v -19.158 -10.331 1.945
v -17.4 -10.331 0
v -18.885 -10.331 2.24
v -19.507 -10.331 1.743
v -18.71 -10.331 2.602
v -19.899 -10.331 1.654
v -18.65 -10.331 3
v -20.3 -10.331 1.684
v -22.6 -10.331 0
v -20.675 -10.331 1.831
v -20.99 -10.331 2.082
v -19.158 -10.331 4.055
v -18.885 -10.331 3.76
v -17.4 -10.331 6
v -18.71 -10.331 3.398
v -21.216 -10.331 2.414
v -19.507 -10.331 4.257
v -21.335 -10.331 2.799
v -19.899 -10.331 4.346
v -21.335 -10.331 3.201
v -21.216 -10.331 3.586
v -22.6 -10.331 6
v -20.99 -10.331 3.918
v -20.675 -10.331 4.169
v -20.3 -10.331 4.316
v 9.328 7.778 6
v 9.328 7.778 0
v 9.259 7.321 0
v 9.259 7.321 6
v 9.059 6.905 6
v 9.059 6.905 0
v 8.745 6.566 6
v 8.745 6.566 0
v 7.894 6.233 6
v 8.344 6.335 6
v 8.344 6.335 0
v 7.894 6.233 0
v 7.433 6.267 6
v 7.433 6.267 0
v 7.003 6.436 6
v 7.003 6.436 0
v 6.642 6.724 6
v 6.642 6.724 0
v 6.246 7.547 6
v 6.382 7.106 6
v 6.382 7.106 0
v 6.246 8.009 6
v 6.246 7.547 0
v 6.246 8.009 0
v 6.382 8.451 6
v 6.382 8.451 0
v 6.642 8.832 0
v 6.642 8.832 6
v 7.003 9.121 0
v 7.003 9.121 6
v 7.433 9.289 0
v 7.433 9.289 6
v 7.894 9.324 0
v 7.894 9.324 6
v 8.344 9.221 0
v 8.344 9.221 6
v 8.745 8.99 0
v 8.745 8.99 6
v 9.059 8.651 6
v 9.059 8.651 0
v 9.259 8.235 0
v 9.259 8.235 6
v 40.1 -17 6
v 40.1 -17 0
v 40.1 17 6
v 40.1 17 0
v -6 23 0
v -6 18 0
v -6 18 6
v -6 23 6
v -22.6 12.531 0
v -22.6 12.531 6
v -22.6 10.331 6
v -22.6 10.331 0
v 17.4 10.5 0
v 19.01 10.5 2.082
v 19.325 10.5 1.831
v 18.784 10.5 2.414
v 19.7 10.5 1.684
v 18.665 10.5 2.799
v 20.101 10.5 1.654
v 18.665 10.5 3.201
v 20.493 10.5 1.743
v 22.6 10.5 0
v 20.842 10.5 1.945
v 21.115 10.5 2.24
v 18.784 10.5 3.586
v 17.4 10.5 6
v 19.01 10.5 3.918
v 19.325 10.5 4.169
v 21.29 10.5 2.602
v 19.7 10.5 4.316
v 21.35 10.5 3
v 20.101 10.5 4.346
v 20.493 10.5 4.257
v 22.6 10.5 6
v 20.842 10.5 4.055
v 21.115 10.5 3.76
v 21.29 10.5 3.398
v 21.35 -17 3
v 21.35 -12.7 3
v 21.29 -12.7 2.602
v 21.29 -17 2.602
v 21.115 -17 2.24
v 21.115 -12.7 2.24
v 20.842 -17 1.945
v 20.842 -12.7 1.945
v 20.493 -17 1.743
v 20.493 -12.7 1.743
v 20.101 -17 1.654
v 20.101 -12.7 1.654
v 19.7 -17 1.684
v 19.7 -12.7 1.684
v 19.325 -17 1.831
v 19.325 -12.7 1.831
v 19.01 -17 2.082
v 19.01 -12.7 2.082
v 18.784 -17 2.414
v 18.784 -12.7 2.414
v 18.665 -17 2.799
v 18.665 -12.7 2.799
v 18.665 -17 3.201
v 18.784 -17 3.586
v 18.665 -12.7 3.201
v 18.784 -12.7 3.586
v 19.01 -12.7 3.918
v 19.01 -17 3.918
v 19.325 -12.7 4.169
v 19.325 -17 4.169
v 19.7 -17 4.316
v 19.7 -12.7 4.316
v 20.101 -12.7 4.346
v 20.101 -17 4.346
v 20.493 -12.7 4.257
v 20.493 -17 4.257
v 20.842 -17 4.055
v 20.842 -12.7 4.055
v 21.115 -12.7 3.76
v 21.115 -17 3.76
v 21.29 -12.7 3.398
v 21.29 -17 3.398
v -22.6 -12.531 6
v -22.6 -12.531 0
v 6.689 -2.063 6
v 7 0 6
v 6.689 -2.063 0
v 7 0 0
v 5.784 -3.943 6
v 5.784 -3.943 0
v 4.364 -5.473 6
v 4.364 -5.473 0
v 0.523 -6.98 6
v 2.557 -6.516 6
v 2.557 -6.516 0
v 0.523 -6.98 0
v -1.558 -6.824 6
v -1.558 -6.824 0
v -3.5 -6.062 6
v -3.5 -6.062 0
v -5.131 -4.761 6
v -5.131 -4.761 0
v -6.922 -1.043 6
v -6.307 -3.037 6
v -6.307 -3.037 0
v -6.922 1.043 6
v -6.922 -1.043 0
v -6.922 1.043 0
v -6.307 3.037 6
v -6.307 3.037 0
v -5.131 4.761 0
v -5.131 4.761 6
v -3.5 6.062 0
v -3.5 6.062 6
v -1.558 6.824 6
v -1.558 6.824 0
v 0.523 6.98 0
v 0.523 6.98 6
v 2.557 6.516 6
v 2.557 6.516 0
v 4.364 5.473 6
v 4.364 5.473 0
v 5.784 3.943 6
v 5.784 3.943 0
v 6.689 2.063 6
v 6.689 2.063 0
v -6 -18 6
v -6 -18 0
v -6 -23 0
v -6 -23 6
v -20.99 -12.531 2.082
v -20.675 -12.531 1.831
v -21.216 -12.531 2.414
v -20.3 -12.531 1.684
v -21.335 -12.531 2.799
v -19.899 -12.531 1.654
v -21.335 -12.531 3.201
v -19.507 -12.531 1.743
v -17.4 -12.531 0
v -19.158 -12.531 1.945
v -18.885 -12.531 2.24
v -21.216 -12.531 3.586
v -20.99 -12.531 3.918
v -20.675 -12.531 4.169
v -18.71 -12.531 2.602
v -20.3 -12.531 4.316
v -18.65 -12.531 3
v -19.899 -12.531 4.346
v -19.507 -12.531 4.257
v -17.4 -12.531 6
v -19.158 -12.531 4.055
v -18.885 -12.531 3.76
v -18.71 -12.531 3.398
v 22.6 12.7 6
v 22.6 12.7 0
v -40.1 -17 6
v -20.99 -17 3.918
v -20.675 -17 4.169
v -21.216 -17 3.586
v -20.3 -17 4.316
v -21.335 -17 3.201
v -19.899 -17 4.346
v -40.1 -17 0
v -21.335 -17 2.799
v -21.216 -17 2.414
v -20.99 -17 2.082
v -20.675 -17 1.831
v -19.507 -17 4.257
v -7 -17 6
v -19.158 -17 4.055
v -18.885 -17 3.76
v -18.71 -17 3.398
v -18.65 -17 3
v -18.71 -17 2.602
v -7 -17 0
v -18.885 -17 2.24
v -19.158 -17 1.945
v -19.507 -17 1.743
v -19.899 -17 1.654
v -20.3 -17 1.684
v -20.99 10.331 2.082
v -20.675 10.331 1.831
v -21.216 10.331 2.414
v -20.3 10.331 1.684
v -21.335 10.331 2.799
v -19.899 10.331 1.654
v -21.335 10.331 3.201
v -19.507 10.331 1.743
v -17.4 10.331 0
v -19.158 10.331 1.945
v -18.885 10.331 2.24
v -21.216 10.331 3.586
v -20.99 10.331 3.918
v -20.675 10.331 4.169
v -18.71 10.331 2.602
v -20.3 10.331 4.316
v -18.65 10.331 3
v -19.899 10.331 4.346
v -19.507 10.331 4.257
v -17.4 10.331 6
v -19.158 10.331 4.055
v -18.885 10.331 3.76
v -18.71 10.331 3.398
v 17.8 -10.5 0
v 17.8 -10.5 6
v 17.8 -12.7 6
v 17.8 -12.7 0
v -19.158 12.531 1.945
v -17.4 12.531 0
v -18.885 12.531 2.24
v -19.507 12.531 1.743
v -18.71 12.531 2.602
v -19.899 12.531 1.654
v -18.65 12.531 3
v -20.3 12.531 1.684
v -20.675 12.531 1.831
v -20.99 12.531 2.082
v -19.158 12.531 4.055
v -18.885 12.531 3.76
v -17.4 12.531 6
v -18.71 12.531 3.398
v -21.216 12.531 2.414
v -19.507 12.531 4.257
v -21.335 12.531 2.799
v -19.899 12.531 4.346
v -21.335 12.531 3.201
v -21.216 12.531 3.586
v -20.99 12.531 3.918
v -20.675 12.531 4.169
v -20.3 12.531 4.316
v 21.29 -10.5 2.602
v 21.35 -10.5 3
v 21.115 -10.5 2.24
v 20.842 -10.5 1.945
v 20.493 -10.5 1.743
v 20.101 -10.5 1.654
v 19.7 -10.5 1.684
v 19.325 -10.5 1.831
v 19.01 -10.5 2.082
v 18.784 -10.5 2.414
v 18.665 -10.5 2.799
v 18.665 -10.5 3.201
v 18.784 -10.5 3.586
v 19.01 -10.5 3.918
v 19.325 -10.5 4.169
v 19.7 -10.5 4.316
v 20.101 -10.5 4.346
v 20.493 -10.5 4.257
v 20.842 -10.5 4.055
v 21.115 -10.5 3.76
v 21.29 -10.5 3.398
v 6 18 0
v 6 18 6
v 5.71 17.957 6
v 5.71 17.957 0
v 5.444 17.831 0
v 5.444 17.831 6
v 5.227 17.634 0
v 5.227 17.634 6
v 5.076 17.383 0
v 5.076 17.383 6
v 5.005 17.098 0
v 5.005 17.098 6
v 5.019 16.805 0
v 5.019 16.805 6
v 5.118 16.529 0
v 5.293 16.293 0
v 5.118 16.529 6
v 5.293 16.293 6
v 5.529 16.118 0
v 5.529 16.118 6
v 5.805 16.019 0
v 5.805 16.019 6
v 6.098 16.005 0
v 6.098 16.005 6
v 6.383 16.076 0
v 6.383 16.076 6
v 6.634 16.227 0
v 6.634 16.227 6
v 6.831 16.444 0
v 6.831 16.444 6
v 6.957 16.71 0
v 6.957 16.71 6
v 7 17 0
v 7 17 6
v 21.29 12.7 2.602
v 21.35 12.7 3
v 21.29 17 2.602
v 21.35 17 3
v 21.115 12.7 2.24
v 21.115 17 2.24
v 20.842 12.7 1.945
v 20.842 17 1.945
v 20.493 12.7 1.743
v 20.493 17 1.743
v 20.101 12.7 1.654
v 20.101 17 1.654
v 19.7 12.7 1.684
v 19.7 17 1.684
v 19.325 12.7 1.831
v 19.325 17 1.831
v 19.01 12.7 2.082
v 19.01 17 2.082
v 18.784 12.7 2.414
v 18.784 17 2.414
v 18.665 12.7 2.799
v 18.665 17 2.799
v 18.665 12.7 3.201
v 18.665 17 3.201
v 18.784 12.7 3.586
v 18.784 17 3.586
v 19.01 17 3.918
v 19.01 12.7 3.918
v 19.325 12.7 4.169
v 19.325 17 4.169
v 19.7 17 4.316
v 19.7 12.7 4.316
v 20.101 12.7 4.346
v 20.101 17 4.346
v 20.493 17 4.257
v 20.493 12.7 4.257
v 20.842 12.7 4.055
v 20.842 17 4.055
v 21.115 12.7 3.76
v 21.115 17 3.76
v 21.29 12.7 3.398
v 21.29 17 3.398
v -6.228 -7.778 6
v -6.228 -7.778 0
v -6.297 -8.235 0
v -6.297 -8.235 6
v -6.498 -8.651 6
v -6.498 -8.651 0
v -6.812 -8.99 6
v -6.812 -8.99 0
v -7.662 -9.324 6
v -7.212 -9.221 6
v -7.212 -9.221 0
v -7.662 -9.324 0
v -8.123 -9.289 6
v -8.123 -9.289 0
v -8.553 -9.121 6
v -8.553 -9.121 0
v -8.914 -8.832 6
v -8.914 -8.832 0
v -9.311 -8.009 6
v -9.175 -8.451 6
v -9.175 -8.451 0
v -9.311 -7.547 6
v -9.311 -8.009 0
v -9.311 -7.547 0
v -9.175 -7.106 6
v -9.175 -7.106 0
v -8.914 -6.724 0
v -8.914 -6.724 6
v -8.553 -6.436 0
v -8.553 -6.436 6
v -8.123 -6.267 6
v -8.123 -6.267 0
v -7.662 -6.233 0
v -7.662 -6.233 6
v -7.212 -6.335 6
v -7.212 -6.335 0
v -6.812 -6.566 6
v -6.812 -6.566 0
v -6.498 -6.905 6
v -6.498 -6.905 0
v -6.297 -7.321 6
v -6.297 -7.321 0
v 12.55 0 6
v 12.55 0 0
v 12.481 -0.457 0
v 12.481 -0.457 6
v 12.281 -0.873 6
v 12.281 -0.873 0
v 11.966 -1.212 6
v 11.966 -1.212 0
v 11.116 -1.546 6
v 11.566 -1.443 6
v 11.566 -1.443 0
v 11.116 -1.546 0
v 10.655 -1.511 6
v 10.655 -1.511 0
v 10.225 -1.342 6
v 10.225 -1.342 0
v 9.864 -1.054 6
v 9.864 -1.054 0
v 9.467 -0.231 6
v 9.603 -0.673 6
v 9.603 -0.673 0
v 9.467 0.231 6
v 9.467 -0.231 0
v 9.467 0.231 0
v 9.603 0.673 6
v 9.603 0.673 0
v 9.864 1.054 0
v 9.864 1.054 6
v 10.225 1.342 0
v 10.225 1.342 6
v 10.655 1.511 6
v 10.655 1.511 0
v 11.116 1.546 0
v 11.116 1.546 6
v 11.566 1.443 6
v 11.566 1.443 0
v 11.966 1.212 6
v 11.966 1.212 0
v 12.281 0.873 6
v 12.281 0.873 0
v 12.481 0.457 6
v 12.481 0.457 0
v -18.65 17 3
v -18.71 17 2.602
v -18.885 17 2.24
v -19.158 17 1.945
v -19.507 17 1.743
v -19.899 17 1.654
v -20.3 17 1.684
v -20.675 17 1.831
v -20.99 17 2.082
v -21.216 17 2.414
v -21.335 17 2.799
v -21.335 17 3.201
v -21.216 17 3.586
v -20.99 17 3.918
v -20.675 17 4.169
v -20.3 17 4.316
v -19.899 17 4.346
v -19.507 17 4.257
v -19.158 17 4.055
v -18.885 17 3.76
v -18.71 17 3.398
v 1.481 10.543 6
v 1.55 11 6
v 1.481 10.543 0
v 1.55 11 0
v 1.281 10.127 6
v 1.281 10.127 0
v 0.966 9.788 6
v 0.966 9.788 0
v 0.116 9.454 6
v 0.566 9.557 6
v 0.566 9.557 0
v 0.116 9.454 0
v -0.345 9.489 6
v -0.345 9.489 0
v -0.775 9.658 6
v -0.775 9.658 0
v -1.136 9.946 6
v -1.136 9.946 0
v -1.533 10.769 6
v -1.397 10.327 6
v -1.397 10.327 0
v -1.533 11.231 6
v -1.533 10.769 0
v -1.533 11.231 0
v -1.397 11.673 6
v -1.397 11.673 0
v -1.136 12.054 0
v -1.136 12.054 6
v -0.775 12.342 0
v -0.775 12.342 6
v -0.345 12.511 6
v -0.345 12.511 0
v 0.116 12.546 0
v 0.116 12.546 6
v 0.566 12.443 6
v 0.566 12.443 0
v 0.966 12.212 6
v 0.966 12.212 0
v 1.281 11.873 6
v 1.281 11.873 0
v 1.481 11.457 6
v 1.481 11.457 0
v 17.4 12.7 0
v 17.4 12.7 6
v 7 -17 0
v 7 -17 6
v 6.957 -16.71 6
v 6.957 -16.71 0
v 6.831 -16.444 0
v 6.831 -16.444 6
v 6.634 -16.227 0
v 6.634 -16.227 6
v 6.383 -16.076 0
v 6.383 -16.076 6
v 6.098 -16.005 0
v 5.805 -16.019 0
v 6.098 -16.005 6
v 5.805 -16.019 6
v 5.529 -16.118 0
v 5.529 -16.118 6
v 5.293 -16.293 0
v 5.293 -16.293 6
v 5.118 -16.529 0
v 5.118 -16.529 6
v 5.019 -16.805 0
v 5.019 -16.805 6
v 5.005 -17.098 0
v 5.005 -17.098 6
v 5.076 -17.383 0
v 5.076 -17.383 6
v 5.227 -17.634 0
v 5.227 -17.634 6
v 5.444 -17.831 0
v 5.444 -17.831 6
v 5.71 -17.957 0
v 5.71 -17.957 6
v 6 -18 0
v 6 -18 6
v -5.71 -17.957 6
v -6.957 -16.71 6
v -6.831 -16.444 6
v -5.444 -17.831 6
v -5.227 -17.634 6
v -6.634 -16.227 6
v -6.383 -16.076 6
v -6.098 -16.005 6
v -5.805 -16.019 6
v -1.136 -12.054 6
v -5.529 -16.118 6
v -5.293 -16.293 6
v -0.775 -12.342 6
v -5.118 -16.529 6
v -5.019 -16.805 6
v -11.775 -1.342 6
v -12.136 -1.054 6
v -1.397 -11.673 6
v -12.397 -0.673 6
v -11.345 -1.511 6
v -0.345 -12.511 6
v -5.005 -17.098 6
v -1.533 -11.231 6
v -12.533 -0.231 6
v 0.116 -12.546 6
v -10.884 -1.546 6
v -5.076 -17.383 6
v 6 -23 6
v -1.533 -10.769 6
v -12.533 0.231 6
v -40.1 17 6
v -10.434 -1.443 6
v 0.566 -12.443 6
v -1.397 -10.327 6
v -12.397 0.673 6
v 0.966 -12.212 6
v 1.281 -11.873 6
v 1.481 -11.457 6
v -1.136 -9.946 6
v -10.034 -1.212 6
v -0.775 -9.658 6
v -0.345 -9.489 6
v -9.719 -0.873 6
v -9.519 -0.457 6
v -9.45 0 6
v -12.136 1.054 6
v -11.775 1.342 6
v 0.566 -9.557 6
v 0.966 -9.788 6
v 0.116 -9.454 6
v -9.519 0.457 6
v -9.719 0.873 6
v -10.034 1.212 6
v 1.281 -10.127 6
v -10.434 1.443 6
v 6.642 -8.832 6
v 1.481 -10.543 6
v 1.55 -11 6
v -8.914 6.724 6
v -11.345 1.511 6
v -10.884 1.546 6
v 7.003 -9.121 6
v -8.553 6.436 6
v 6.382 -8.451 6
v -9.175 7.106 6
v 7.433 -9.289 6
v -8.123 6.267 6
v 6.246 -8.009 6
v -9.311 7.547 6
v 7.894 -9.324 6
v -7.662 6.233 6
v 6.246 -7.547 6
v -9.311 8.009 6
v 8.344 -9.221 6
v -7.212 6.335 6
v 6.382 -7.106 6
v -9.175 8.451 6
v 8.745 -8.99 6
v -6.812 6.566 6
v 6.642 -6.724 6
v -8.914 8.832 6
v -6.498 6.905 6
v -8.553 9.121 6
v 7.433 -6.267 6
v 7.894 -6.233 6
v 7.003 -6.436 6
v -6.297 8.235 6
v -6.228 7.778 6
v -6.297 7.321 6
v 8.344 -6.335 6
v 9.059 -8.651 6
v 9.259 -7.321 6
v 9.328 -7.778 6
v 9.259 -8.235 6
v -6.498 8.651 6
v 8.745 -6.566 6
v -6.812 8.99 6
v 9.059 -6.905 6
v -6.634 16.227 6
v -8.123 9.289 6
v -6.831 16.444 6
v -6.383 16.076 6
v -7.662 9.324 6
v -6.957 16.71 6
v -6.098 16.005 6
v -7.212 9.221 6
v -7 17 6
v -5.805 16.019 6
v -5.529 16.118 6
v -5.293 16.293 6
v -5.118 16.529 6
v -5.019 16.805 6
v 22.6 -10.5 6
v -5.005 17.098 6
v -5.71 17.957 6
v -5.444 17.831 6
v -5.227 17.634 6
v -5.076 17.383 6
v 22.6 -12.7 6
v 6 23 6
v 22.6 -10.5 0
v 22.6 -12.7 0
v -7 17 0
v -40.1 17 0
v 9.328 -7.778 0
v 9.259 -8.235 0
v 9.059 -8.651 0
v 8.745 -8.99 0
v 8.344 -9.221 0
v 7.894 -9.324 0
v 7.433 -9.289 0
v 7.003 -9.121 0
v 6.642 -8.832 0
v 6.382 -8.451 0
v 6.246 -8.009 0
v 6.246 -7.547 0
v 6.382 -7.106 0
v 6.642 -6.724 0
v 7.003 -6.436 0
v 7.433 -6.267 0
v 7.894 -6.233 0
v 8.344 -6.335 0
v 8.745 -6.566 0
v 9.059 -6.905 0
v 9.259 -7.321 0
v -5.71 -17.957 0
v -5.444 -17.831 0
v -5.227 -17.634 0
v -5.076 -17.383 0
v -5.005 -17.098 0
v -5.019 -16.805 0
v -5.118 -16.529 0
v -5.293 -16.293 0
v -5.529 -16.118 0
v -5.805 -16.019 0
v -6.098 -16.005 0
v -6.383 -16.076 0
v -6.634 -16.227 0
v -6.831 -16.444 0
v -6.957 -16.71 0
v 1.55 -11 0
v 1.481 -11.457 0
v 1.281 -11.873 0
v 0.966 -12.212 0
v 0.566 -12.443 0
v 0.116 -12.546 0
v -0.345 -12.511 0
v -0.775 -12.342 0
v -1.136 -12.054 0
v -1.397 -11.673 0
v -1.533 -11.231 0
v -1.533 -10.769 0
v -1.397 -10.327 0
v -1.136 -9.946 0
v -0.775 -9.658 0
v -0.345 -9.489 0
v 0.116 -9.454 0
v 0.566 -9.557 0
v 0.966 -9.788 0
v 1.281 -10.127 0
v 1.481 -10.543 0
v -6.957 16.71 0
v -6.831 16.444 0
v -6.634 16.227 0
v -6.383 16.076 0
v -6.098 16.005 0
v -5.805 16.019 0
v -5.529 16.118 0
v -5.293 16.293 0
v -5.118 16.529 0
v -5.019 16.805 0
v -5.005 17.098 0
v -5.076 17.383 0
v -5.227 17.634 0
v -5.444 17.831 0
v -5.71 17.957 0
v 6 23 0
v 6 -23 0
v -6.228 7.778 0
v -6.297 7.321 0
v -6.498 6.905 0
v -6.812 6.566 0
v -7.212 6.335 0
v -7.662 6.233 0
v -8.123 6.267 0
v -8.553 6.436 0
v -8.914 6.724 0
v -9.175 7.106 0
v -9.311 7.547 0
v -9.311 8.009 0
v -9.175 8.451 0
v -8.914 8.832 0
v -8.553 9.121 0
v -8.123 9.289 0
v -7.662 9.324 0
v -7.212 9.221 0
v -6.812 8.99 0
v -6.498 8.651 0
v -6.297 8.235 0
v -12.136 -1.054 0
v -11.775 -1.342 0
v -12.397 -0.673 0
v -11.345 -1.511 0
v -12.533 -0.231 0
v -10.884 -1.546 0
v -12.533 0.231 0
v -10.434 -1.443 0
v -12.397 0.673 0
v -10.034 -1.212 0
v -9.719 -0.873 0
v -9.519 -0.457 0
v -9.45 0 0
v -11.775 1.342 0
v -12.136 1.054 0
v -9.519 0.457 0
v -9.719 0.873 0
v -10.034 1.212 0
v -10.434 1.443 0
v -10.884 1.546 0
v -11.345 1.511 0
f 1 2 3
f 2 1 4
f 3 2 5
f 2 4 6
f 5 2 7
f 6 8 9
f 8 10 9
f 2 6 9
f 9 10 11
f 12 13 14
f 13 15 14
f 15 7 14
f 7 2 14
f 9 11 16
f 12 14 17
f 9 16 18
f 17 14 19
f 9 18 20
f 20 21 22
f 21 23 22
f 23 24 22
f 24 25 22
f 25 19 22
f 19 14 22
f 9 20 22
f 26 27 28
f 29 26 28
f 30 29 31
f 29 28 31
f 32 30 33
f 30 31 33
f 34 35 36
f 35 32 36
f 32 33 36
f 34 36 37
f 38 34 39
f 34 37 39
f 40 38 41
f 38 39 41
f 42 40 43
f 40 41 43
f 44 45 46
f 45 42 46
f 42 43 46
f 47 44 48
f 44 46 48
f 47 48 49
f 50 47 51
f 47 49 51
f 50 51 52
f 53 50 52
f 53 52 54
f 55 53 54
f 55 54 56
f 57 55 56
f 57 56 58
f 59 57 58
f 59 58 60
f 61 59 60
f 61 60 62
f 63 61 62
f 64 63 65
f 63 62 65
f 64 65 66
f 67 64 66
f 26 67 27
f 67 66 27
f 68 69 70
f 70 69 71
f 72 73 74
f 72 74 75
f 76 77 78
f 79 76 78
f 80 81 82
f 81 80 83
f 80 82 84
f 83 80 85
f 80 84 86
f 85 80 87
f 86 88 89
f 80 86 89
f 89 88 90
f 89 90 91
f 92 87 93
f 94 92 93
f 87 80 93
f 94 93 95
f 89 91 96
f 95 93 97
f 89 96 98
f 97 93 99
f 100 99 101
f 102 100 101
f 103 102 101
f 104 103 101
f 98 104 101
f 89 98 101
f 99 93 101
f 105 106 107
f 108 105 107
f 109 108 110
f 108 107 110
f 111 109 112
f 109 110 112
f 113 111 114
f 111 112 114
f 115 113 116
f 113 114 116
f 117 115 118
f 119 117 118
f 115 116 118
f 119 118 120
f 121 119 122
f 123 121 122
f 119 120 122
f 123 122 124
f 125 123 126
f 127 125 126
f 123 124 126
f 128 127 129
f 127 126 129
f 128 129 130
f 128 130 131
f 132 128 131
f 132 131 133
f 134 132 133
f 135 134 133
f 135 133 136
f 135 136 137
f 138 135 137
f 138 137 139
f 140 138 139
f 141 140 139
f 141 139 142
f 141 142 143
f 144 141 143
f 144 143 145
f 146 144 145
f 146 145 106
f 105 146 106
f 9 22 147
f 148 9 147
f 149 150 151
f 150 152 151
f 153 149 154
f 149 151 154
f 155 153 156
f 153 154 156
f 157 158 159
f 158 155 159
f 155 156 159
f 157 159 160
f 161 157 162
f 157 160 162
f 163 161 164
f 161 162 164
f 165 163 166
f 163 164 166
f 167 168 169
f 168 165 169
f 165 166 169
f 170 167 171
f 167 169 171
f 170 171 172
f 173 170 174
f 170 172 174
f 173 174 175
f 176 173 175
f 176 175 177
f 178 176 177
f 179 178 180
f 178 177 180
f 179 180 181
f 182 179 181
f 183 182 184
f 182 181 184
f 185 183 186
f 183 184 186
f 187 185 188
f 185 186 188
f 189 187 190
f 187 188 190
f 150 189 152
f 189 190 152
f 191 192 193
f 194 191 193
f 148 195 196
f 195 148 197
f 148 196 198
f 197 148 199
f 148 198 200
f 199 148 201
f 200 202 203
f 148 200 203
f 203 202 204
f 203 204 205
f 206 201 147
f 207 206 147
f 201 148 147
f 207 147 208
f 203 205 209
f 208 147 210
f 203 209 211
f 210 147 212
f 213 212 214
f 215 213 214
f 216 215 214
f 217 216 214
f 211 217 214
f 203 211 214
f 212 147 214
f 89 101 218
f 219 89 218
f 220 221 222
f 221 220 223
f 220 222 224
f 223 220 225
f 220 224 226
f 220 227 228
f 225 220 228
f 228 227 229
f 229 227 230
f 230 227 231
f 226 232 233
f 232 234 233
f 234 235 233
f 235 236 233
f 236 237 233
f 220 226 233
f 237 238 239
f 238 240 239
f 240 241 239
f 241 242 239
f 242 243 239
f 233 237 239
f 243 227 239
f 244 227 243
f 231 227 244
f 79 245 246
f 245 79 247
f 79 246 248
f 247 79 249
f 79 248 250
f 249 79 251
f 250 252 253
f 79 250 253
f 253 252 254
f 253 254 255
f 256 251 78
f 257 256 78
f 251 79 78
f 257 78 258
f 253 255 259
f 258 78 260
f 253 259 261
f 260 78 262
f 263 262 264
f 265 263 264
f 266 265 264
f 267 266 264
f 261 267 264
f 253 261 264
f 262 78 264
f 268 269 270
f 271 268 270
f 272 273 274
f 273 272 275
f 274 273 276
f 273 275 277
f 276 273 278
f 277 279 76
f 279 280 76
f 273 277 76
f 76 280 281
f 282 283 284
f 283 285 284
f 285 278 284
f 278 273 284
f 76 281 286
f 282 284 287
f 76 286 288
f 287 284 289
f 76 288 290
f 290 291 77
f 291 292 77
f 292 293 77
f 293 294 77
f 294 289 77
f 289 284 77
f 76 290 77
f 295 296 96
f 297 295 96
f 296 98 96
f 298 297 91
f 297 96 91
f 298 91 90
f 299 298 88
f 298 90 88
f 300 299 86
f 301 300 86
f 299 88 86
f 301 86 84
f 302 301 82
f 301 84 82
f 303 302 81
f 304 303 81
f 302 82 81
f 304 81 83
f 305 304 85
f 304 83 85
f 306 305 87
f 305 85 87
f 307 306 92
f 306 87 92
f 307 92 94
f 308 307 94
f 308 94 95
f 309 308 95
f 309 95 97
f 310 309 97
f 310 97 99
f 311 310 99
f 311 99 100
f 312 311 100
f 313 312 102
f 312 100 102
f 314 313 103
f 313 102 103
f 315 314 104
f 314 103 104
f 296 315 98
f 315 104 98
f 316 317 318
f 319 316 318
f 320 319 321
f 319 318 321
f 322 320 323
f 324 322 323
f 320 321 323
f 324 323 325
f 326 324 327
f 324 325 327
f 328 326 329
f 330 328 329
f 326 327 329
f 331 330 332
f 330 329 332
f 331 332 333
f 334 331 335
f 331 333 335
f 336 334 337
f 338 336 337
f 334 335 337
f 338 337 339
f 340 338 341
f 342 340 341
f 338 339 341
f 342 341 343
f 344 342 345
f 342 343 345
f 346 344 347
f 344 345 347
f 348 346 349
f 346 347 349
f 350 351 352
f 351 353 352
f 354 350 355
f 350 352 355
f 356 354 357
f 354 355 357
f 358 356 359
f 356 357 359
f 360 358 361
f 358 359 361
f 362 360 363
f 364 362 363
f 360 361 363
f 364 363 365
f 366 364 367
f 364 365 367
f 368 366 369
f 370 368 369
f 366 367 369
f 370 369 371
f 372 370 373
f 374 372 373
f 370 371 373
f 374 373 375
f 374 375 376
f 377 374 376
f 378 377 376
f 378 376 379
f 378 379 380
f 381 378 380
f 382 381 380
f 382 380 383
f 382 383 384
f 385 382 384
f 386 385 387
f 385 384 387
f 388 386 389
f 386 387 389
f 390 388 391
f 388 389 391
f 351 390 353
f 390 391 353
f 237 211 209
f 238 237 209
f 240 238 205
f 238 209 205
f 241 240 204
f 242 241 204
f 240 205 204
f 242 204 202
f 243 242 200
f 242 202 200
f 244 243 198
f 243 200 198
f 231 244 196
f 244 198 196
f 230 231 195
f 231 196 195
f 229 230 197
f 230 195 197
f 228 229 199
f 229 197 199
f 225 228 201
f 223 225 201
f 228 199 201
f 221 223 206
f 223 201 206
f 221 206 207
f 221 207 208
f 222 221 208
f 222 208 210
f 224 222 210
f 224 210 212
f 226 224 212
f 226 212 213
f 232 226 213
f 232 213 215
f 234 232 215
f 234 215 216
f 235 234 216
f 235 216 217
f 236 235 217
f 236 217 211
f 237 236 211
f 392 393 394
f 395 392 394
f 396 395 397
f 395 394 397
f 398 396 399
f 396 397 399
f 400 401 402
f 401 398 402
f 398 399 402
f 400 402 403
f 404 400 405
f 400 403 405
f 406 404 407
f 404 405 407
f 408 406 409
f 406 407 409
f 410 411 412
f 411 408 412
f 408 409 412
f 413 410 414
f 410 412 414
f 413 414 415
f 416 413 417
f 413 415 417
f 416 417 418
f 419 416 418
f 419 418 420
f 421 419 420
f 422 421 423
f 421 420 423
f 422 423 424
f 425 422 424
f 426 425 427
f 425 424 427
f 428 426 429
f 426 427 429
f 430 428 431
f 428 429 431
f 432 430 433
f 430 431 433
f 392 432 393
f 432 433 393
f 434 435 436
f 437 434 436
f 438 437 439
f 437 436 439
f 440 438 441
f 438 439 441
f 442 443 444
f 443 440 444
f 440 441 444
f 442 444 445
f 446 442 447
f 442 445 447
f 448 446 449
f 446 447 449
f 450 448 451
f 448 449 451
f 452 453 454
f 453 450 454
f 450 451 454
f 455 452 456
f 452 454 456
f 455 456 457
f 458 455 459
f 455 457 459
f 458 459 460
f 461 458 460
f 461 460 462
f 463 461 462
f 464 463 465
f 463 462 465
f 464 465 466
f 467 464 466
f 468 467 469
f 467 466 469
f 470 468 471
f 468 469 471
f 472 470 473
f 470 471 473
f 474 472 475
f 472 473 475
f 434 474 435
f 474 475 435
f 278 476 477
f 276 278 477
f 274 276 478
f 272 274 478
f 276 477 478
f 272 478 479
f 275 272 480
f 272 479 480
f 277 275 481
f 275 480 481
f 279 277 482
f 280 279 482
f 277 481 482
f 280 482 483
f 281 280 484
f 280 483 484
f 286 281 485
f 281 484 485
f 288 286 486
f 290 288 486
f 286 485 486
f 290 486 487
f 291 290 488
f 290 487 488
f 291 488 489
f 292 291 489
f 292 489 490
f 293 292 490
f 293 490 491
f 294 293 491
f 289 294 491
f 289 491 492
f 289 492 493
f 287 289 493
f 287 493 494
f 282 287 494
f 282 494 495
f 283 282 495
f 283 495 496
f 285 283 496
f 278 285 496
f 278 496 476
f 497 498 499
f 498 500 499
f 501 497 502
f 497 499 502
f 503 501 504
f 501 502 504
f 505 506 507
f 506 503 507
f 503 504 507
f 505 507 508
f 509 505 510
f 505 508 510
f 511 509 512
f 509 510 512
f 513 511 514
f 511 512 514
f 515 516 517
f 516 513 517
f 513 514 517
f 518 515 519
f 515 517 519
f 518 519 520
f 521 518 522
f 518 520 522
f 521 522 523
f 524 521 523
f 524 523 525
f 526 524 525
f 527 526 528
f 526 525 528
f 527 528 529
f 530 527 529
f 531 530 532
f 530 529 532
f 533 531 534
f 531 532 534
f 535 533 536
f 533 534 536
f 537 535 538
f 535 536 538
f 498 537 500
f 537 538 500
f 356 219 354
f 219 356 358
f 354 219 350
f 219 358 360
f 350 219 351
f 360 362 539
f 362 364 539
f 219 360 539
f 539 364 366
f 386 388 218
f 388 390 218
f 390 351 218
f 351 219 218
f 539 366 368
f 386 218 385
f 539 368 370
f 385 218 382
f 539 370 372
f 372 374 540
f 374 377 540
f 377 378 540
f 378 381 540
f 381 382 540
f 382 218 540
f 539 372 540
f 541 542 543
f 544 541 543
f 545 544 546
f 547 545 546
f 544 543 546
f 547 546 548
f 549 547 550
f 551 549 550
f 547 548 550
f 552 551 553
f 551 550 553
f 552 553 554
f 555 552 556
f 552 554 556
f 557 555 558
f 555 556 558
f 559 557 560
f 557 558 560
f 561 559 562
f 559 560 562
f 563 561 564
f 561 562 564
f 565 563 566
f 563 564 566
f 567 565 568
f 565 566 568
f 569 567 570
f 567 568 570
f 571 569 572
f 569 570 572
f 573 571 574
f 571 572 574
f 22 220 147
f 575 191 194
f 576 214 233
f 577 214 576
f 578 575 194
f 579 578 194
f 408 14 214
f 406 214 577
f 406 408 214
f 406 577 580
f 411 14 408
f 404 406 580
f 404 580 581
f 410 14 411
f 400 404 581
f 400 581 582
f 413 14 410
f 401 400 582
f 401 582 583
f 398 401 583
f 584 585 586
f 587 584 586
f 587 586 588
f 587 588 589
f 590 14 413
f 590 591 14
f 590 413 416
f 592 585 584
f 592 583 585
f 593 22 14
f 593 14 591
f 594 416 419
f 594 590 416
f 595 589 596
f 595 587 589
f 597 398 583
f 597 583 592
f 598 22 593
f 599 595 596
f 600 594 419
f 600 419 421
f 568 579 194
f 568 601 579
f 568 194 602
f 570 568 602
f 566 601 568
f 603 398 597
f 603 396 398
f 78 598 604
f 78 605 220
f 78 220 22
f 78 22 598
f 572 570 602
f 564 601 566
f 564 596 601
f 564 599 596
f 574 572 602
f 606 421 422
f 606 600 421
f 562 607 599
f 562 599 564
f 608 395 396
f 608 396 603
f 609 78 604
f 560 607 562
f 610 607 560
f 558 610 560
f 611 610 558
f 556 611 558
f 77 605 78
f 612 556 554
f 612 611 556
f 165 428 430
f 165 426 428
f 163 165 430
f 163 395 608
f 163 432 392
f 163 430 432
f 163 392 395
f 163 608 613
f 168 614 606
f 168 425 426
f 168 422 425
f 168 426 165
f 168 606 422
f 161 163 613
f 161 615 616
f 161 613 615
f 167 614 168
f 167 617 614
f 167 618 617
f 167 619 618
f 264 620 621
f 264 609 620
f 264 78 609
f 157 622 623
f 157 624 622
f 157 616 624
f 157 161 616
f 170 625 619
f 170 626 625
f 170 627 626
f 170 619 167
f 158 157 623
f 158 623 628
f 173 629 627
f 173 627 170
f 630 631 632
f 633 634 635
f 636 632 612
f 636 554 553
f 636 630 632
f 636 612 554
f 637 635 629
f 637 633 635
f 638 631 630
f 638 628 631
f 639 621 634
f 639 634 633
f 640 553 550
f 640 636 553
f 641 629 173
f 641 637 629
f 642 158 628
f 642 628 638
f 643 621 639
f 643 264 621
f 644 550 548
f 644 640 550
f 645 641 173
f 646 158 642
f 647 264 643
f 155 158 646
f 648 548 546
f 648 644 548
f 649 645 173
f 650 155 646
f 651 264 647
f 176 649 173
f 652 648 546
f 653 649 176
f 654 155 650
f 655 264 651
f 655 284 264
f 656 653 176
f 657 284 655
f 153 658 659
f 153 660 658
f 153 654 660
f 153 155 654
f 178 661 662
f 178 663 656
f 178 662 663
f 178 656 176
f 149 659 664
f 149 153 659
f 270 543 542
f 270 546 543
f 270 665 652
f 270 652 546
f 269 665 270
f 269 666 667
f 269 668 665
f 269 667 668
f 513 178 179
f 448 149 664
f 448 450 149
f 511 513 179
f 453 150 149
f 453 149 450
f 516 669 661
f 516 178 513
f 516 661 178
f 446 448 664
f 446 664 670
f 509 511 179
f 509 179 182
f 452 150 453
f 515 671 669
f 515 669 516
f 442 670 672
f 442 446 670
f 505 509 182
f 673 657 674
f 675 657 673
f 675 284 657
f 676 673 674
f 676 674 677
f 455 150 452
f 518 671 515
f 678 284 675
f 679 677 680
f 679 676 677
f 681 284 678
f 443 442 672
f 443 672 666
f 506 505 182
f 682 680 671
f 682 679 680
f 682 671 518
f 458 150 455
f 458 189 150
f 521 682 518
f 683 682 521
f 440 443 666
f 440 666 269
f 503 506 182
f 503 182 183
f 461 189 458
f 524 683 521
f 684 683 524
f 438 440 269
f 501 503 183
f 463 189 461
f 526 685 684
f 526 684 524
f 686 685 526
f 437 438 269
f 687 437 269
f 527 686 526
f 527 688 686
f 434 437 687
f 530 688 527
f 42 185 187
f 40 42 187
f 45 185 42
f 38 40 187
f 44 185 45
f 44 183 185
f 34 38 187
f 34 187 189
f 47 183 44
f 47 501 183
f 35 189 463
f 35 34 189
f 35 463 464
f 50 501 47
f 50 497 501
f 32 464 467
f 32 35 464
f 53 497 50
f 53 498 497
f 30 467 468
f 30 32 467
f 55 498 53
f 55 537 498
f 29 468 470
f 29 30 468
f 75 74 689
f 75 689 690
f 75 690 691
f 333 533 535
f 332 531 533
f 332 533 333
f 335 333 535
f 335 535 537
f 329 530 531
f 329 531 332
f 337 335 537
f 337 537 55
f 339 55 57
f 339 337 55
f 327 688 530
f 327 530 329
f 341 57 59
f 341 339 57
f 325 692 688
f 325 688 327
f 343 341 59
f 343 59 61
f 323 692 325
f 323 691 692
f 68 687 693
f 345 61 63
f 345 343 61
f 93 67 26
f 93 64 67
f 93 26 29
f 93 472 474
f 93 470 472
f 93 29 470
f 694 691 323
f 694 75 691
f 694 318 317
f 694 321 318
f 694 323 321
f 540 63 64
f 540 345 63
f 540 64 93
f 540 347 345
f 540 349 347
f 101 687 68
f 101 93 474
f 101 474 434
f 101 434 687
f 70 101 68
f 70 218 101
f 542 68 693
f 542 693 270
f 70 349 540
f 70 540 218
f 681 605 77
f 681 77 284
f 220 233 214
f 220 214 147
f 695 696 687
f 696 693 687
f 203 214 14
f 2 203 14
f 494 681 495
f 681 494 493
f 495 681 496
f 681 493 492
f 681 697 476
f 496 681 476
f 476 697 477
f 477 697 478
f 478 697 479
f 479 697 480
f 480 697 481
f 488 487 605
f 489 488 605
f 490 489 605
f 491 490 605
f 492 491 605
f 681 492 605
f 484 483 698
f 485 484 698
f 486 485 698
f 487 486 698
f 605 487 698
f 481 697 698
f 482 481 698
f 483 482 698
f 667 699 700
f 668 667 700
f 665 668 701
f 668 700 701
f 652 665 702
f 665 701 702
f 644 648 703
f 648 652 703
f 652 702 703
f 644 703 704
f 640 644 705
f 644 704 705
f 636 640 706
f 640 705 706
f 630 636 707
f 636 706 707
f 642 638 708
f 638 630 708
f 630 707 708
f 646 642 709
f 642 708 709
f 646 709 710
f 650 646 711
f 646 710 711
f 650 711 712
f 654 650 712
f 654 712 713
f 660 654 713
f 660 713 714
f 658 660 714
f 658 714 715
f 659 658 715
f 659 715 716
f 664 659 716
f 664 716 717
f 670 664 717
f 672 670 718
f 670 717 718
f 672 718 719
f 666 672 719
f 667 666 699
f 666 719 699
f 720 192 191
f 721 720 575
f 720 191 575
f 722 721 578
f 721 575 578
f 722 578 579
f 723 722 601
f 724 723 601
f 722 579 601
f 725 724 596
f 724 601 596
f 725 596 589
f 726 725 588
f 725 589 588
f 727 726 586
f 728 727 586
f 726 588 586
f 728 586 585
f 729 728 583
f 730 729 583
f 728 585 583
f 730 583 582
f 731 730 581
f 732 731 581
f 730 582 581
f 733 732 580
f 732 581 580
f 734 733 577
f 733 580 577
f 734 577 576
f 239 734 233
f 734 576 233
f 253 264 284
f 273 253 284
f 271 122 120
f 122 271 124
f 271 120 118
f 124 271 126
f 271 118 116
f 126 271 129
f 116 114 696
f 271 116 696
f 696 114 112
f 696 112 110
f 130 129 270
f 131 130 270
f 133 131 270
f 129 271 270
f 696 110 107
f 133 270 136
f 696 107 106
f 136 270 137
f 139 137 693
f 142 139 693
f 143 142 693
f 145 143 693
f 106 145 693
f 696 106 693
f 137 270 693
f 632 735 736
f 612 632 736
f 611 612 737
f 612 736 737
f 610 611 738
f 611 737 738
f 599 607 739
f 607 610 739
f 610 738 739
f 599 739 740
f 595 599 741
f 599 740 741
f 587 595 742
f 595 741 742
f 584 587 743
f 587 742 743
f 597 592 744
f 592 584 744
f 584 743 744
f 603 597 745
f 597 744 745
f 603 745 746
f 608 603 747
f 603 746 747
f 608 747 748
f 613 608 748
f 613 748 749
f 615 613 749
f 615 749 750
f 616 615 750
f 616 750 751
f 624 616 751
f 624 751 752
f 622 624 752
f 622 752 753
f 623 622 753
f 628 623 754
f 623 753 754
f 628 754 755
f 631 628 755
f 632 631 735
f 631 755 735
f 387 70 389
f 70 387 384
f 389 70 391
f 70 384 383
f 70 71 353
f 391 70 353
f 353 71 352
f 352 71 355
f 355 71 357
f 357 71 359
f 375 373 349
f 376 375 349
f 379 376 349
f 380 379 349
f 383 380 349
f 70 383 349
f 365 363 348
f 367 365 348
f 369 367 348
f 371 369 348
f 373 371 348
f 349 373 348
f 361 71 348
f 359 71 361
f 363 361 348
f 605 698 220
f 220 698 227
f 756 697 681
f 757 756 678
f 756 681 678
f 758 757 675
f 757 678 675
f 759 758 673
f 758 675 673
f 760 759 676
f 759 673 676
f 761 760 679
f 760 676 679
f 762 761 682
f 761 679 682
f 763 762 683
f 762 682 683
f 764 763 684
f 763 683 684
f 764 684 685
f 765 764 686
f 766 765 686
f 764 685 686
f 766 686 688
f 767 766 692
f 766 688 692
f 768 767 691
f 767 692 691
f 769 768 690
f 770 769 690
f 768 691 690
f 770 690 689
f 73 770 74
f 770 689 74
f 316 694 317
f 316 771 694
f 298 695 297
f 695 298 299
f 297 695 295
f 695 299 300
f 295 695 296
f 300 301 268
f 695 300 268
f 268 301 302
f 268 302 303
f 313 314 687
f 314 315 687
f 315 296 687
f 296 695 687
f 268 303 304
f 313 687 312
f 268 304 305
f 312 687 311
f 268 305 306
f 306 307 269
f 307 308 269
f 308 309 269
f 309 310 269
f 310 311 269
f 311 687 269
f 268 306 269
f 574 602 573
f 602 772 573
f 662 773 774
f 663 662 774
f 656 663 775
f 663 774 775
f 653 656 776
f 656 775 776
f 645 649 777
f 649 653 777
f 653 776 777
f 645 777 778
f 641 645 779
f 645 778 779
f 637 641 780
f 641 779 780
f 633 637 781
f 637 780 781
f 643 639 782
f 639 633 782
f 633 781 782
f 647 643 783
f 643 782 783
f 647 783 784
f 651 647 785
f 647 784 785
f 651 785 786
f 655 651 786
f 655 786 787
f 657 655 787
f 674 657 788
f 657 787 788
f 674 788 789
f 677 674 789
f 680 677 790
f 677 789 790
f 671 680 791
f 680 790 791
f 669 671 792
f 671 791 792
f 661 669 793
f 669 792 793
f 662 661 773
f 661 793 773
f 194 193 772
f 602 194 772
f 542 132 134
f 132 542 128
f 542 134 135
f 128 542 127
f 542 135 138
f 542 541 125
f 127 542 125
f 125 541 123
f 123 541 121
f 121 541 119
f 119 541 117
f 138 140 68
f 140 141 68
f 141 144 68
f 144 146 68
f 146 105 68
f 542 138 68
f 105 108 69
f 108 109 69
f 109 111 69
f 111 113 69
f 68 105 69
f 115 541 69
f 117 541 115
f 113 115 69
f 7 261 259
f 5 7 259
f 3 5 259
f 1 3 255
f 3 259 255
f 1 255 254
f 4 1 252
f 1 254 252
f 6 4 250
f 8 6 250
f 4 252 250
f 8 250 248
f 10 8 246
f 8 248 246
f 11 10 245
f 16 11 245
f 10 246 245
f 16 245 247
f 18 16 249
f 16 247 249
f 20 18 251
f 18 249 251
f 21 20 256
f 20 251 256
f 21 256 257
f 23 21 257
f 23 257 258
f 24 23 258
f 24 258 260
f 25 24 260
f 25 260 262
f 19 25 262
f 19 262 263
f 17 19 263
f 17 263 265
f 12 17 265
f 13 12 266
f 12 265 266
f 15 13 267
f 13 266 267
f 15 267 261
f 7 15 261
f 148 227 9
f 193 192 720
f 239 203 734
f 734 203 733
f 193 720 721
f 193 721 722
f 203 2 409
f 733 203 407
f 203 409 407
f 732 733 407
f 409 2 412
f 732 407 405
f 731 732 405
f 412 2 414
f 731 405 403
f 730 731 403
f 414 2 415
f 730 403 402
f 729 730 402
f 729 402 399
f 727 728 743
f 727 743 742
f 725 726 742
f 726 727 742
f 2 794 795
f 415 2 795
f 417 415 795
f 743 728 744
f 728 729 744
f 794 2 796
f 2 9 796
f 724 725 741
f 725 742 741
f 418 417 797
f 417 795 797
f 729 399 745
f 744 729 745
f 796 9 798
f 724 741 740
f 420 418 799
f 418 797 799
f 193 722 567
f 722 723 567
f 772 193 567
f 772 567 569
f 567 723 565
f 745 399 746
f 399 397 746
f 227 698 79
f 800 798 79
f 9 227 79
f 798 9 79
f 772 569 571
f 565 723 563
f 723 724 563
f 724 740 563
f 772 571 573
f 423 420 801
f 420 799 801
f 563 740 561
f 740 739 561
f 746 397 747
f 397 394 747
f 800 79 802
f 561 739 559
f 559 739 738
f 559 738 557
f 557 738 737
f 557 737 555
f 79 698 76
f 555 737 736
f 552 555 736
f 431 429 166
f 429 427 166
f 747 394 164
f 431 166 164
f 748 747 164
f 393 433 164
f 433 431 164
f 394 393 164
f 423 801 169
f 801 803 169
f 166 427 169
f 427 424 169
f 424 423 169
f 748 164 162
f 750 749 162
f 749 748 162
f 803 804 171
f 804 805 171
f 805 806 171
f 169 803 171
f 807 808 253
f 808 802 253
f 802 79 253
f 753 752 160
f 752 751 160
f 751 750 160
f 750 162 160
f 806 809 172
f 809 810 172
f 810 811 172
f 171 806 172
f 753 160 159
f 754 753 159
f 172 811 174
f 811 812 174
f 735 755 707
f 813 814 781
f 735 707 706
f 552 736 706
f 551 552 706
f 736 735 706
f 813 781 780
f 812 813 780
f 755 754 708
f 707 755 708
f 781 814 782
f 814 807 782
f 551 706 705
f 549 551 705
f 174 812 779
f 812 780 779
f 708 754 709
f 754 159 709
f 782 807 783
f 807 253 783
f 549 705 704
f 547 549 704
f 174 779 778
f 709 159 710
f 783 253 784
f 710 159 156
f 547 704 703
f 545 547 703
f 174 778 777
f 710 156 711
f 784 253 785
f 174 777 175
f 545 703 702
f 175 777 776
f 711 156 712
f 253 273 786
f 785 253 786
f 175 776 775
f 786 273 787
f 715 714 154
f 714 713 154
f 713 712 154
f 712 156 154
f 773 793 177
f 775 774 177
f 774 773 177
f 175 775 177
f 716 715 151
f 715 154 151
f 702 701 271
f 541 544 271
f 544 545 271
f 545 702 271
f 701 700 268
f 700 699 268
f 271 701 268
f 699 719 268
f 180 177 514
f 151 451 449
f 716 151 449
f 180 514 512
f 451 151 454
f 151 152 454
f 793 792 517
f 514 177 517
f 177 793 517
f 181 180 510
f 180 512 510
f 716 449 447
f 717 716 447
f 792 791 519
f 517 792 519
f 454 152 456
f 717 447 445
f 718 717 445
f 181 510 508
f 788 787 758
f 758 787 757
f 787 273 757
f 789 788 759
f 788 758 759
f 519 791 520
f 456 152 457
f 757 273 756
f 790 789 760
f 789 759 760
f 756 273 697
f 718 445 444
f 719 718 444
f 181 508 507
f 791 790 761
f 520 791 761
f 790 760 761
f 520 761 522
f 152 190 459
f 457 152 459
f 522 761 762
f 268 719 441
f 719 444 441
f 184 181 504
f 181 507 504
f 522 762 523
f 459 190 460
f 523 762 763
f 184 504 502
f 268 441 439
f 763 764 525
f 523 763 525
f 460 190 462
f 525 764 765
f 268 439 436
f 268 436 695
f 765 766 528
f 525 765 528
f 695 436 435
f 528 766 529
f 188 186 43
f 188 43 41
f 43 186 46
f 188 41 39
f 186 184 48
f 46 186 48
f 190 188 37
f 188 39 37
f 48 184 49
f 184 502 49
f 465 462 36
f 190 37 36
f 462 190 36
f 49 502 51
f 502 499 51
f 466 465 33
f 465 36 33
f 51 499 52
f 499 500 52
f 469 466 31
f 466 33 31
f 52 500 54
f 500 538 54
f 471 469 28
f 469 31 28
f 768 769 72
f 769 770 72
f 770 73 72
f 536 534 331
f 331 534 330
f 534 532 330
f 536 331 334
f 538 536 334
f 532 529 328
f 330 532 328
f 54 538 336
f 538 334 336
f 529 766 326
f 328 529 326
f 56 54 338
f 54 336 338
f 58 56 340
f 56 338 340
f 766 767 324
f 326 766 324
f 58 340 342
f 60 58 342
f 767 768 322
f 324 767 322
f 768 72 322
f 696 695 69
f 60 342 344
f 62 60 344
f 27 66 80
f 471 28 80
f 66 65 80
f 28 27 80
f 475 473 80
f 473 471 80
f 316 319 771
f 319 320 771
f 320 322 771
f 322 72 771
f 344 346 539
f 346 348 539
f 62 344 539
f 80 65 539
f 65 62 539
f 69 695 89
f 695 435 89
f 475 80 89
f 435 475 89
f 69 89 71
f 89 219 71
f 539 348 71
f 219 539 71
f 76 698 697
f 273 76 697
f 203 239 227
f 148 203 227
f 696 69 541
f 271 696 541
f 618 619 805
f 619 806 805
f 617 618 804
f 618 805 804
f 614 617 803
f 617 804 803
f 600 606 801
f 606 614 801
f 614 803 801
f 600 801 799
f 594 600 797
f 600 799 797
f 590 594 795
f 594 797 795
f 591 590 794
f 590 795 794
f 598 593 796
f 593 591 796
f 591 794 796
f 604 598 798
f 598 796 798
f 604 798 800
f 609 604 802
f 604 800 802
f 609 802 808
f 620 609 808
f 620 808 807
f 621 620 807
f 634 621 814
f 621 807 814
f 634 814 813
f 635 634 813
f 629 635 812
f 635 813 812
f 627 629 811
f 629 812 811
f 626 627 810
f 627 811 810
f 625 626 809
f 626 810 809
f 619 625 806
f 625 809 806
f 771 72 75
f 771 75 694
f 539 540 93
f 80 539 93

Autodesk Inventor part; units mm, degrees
ref_plane "YZ Plane" through (0, 0, 0) normal (1, 0, 0) x (0, 1, 0)
ref_plane "XZ Plane" through (0, 0, 0) normal (0, 1, 0) x (-1, 0, 0)
ref_plane "XY Plane" through (0, 0, 0) normal (0, 0, 1) x (1, 0, 0)
ref_plane "작업 평면1" through (0, 0, 0) normal (0, 0, 1) x (1, 0, 0)
sketch "스케치1" plane through (0, 0, 0) normal (0, 0, 1) x (1, 0, 0)
  circle A0 centre (-7.7782, -7.7782) radius 1.55 projected
  circle A1 centre (7.7782, -7.7782) radius 1.55 projected
  circle A2 centre (7.7782, 7.7782) radius 1.55 projected
  circle A3 centre (-7.7782, 7.7782) radius 1.55 projected
  circle A4 centre (0, 0) radius 5 projected
  circle A5 centre (0, 0) radius 13.9 projected
  circle A6 centre (0, 11) radius 1.55 projected
  circle A7 centre (11, 0) radius 1.55 projected
  circle A8 centre (0, -11) radius 1.55 projected
  circle A9 centre (-11, 0) radius 1.55 projected
  line L0 (-40.1, -17) -> (40.1, -17)
  line L1 (40.1, -17) -> (40.1, 17)
  line L2 (40.1, 17) -> (-40.1, 17)
  line L3 (-40.1, 17) -> (-40.1, -17)
  line L4 (-40.1, -17) -> (40.1, 17) construction
  line L5 (40.1, -17) -> (-40.1, 17) construction
  circle A10 centre (0, 0) radius 7
  circle A11 centre (0, 11) radius 1.35
  circle A12 centre (-7.7782, 7.7782) radius 1.35
  circle A13 centre (-11, 0) radius 1.35
  circle A14 centre (-7.7782, -7.7782) radius 1.35
  circle A15 centre (0, -11) radius 1.35
  circle A16 centre (7.7782, -7.7782) radius 1.35
  circle A17 centre (11, 0) radius 1.35
  circle A18 centre (7.7782, 7.7782) radius 1.35
  line L6 (6, 17) -> (-6, 17)
  line L7 (-6, 17) -> (-6, 23)
  line L8 (-6, 23) -> (6, 23)
  line L9 (6, 23) -> (6, 17)
  line L10 (6, -17) -> (-6, -17)
  line L11 (-6, -17) -> (-6, -23)
  line L12 (-6, -23) -> (6, -23)
  line L13 (6, -23) -> (6, -17)
  point P0 (0, 0)
  point P1 (0, 0)
  point P2 (0, 0)
  point P3 (0, 0)
  point P4 (0, 0)
  point P5 (0, 0)
  point P6 (0, 0)
  point P7 (0, 0)
  dimension "d0" = 80.2
  dimension "d1" = 34
  dimension "d2" = 2
  dimension "d3" = 2.7
  dimension "d6" = 360
  dimension "d8" = 12
  dimension "d9" = 6
  dimension "d10" = 12
  dimension "d11" = 6
extrude "돌출1" add sketch "스케치1" along normal blind 6 contours A5 | L3 L2 L1 L0 | L0 L13 L12 L11 | L7 L8 L9 L2
sketch "스케치3" plane through (-6, 23, 0) normal (0, 1, 0) x (1, 0, 0)
  circle A0 centre (26, -3) radius 1.35
  circle A1 centre (-14, -3) radius 1.35
  point P0 (6, 0)
  dimension "d14" = 2.7
  dimension "d15" = 2.7
extrude "돌출2" cut sketch "스케치3" against normal blind 100
sketch "스케치4" plane through (0, 0, 6) normal (0, 0, 1) x (1, 0, 0)
  line L0 (22.2, 12.7) -> (17, 10.5) construction
  line L1 (17, 12.7) -> (22.2, 10.5) construction
  line L2 (-22.2, 12.7) -> (-17, 10.5) construction
  line L3 (-17, 12.7) -> (-22.2, 10.5) construction
  line L4 (17.8, -12.7) -> (23, -12.7)
  line L5 (23, -10.5) -> (17.8, -10.5)
  line L6 (17.8, -10.5) -> (17.8, -12.7)
  line L7 (17.8, -12.7) -> (23, -10.5) construction
  line L8 (23, -12.7) -> (17.8, -10.5) construction
  line L9 (-22.2, -12.7) -> (-17, -10.5) construction
  line L10 (-17, -12.7) -> (-22.2, -10.5) construction
  line L11 (18.65, 17) -> (18.65, -17) projected
  line L12 (21.35, 17) -> (21.35, -17) projected
  line L13 (17.4, 10.5) -> (22.6, 10.5)
  line L14 (22.6, 10.5) -> (22.6, 12.7)
  line L15 (22.6, 12.7) -> (17.4, 12.7)
  line L16 (17.4, 12.7) -> (17.4, 10.5)
  line L17 (17.4, 10.5) -> (22.6, 12.7) construction
  line L18 (22.6, 10.5) -> (17.4, 12.7) construction
  line L19 (-22.6, 10.3308) -> (-17.4, 10.3308)
  line L20 (-17.4, 10.3308) -> (-17.4, 12.5308)
  line L21 (-17.4, 12.5308) -> (-22.6, 12.5308)
  line L22 (-22.6, 12.5308) -> (-22.6, 10.3308)
  line L23 (-22.6, 10.3308) -> (-17.4, 12.5308) construction
  line L24 (-17.4, 10.3308) -> (-22.6, 12.5308) construction
  line L25 (22.6, -12.7) -> (22.6, -10.5)
  line L26 (17.4, -12.7) -> (22.6, -10.5) construction
  line L27 (22.6, -12.7) -> (17.4, -10.5) construction
  line L28 (-22.6, -12.531) -> (-17.4, -12.531)
  line L29 (-17.4, -12.531) -> (-17.4, -10.331)
  line L30 (-17.4, -10.331) -> (-22.6, -10.331)
  line L31 (-22.6, -10.331) -> (-22.6, -12.531)
  line L32 (-22.6, -12.531) -> (-17.4, -10.331) construction
  line L33 (-17.4, -12.531) -> (-22.6, -10.331) construction
  point P0 (0, 0)
  point P1 (-19.6, 11.6)
  point P2 (20.4, -11.6)
  point P3 (-19.6, -11.6)
  point P4 (20, 11.6)
  point P5 (-20, 11.4308)
  point P6 (20, -11.6)
  point P7 (-20, -11.431)
  dimension "d18" = 5.2
  dimension "d19" = 2.2
  dimension "d20" = 5.2
  dimension "d21" = 2.2
  dimension "d22" = 5.2
  dimension "d23" = 2.2
  dimension "d24" = 5.2
  dimension "d25" = 2.2
  dimension "d28" = 5.2
  dimension "d29" = 2.2
  dimension "d30" = 5.2
  dimension "d31" = 2.2
  dimension "d32" = 5.2
  dimension "d33" = 2.2
  dimension "d34" = 5.2
  dimension "d35" = 2.2
extrude "돌출4" cut sketch "스케치4" against normal blind 10 contours L6 L5 L11 L4 | L11 L5 L12 L4 | L12 L5 L25 L4 | L13 L16 L15 L11 | L11 L15 L12 L13 | L12 L15 L14 L13 | L22 L21 L20 L19 | L31 L30 L29 L28
sketch "스케치5" plane through (0, 0, 6) normal (0, 0, 1) x (1, 0, 0)
  line L0 (22.6, 10.5) -> (17.4, 10.5) projected
  line L1 (17.4, 10.5) -> (17.4, 12.7) projected
  line L2 (17.4, 12.7) -> (22.6, 12.7) projected
  line L3 (22.6, 12.7) -> (22.6, 10.5) projected
  line L4 (-22.6, -10.331) -> (-17.4, -10.331) projected
  line L5 (-17.4, -10.331) -> (-17.4, -12.531) projected
  line L6 (-17.4, -12.531) -> (-22.6, -12.531) projected
  line L7 (-22.6, -12.531) -> (-22.6, -10.331) projected
  line L8 (17.8, -12.7) -> (17.8, -10.5) projected
  line L9 (17.8, -10.5) -> (22.6, -10.5) projected
  line L10 (22.6, -10.5) -> (22.6, -12.7) projected
  line L11 (22.6, -12.7) -> (17.8, -12.7) projected
  line L12 (-22.6, 12.5308) -> (-17.4, 12.5308) projected
  line L13 (-17.4, 12.5308) -> (-17.4, 10.3308) projected
  line L14 (-17.4, 10.3308) -> (-22.6, 10.3308) projected
  line L15 (-22.6, 10.3308) -> (-22.6, 12.5308) projected
  line L16 (40.1, 17) -> (6, 17) projected
  line L17 (6, 17) -> (6, 23) projected
  line L18 (6, 23) -> (-6, 23) projected
  line L19 (-6, 23) -> (-6, 17) projected
  line L20 (-6, 17) -> (-40.1, 17) projected
  line L21 (-40.1, 17) -> (-40.1, -17) projected
  line L22 (-40.1, -17) -> (-6, -17) projected
  line L23 (-6, -17) -> (-6, -23) projected
  line L24 (-6, -23) -> (6, -23) projected
  line L25 (6, -23) -> (6, -17) projected
  line L26 (6, -17) -> (40.1, -17) projected
  line L27 (40.1, -17) -> (40.1, 17) projected
  circle A0 centre (-7.7782, -7.7782) radius 1.55 projected
  circle A1 centre (7.7782, -7.7782) radius 1.55 projected
  circle A2 centre (7.7782, 7.7782) radius 1.55 projected
  circle A3 centre (-7.7782, 7.7782) radius 1.55 projected
  circle A4 centre (0, 11) radius 1.55 projected
  circle A5 centre (11, 0) radius 1.55 projected
  circle A6 centre (0, -11) radius 1.55 projected
  circle A7 centre (-11, 0) radius 1.55 projected
  circle A8 centre (0, 0) radius 7 projected
  circle A9 centre (6, 17) radius 1
  circle A10 centre (-6, 17) radius 1
  circle A11 centre (6, -17) radius 1
  circle A12 centre (-6, -17) radius 1
  point P0 (0, 0)
  point P1 (-6, 18)
  point P2 (-7, 17)
  point P3 (6, 18)
  point P4 (7, 17)
  point P5 (7, -17)
  point P6 (6, -18)
  dimension "d38" = 2
  dimension "d39" = 2
  dimension "d40" = 2
  dimension "d41" = 2
extrude "돌출5" cut sketch "스케치5" against normal blind 10 contours A9 L17 L16 | L26 L25 A11 | A10 L20 L19 | A12 L22 L23 | L23 L22 A12 picked at (6.5384, 16.6156) picked at (6.5384, -16.6156) picked at (-6.657, 16.9202)
properties part number "hip joint_body connector" material "PMMA 플라스틱"
